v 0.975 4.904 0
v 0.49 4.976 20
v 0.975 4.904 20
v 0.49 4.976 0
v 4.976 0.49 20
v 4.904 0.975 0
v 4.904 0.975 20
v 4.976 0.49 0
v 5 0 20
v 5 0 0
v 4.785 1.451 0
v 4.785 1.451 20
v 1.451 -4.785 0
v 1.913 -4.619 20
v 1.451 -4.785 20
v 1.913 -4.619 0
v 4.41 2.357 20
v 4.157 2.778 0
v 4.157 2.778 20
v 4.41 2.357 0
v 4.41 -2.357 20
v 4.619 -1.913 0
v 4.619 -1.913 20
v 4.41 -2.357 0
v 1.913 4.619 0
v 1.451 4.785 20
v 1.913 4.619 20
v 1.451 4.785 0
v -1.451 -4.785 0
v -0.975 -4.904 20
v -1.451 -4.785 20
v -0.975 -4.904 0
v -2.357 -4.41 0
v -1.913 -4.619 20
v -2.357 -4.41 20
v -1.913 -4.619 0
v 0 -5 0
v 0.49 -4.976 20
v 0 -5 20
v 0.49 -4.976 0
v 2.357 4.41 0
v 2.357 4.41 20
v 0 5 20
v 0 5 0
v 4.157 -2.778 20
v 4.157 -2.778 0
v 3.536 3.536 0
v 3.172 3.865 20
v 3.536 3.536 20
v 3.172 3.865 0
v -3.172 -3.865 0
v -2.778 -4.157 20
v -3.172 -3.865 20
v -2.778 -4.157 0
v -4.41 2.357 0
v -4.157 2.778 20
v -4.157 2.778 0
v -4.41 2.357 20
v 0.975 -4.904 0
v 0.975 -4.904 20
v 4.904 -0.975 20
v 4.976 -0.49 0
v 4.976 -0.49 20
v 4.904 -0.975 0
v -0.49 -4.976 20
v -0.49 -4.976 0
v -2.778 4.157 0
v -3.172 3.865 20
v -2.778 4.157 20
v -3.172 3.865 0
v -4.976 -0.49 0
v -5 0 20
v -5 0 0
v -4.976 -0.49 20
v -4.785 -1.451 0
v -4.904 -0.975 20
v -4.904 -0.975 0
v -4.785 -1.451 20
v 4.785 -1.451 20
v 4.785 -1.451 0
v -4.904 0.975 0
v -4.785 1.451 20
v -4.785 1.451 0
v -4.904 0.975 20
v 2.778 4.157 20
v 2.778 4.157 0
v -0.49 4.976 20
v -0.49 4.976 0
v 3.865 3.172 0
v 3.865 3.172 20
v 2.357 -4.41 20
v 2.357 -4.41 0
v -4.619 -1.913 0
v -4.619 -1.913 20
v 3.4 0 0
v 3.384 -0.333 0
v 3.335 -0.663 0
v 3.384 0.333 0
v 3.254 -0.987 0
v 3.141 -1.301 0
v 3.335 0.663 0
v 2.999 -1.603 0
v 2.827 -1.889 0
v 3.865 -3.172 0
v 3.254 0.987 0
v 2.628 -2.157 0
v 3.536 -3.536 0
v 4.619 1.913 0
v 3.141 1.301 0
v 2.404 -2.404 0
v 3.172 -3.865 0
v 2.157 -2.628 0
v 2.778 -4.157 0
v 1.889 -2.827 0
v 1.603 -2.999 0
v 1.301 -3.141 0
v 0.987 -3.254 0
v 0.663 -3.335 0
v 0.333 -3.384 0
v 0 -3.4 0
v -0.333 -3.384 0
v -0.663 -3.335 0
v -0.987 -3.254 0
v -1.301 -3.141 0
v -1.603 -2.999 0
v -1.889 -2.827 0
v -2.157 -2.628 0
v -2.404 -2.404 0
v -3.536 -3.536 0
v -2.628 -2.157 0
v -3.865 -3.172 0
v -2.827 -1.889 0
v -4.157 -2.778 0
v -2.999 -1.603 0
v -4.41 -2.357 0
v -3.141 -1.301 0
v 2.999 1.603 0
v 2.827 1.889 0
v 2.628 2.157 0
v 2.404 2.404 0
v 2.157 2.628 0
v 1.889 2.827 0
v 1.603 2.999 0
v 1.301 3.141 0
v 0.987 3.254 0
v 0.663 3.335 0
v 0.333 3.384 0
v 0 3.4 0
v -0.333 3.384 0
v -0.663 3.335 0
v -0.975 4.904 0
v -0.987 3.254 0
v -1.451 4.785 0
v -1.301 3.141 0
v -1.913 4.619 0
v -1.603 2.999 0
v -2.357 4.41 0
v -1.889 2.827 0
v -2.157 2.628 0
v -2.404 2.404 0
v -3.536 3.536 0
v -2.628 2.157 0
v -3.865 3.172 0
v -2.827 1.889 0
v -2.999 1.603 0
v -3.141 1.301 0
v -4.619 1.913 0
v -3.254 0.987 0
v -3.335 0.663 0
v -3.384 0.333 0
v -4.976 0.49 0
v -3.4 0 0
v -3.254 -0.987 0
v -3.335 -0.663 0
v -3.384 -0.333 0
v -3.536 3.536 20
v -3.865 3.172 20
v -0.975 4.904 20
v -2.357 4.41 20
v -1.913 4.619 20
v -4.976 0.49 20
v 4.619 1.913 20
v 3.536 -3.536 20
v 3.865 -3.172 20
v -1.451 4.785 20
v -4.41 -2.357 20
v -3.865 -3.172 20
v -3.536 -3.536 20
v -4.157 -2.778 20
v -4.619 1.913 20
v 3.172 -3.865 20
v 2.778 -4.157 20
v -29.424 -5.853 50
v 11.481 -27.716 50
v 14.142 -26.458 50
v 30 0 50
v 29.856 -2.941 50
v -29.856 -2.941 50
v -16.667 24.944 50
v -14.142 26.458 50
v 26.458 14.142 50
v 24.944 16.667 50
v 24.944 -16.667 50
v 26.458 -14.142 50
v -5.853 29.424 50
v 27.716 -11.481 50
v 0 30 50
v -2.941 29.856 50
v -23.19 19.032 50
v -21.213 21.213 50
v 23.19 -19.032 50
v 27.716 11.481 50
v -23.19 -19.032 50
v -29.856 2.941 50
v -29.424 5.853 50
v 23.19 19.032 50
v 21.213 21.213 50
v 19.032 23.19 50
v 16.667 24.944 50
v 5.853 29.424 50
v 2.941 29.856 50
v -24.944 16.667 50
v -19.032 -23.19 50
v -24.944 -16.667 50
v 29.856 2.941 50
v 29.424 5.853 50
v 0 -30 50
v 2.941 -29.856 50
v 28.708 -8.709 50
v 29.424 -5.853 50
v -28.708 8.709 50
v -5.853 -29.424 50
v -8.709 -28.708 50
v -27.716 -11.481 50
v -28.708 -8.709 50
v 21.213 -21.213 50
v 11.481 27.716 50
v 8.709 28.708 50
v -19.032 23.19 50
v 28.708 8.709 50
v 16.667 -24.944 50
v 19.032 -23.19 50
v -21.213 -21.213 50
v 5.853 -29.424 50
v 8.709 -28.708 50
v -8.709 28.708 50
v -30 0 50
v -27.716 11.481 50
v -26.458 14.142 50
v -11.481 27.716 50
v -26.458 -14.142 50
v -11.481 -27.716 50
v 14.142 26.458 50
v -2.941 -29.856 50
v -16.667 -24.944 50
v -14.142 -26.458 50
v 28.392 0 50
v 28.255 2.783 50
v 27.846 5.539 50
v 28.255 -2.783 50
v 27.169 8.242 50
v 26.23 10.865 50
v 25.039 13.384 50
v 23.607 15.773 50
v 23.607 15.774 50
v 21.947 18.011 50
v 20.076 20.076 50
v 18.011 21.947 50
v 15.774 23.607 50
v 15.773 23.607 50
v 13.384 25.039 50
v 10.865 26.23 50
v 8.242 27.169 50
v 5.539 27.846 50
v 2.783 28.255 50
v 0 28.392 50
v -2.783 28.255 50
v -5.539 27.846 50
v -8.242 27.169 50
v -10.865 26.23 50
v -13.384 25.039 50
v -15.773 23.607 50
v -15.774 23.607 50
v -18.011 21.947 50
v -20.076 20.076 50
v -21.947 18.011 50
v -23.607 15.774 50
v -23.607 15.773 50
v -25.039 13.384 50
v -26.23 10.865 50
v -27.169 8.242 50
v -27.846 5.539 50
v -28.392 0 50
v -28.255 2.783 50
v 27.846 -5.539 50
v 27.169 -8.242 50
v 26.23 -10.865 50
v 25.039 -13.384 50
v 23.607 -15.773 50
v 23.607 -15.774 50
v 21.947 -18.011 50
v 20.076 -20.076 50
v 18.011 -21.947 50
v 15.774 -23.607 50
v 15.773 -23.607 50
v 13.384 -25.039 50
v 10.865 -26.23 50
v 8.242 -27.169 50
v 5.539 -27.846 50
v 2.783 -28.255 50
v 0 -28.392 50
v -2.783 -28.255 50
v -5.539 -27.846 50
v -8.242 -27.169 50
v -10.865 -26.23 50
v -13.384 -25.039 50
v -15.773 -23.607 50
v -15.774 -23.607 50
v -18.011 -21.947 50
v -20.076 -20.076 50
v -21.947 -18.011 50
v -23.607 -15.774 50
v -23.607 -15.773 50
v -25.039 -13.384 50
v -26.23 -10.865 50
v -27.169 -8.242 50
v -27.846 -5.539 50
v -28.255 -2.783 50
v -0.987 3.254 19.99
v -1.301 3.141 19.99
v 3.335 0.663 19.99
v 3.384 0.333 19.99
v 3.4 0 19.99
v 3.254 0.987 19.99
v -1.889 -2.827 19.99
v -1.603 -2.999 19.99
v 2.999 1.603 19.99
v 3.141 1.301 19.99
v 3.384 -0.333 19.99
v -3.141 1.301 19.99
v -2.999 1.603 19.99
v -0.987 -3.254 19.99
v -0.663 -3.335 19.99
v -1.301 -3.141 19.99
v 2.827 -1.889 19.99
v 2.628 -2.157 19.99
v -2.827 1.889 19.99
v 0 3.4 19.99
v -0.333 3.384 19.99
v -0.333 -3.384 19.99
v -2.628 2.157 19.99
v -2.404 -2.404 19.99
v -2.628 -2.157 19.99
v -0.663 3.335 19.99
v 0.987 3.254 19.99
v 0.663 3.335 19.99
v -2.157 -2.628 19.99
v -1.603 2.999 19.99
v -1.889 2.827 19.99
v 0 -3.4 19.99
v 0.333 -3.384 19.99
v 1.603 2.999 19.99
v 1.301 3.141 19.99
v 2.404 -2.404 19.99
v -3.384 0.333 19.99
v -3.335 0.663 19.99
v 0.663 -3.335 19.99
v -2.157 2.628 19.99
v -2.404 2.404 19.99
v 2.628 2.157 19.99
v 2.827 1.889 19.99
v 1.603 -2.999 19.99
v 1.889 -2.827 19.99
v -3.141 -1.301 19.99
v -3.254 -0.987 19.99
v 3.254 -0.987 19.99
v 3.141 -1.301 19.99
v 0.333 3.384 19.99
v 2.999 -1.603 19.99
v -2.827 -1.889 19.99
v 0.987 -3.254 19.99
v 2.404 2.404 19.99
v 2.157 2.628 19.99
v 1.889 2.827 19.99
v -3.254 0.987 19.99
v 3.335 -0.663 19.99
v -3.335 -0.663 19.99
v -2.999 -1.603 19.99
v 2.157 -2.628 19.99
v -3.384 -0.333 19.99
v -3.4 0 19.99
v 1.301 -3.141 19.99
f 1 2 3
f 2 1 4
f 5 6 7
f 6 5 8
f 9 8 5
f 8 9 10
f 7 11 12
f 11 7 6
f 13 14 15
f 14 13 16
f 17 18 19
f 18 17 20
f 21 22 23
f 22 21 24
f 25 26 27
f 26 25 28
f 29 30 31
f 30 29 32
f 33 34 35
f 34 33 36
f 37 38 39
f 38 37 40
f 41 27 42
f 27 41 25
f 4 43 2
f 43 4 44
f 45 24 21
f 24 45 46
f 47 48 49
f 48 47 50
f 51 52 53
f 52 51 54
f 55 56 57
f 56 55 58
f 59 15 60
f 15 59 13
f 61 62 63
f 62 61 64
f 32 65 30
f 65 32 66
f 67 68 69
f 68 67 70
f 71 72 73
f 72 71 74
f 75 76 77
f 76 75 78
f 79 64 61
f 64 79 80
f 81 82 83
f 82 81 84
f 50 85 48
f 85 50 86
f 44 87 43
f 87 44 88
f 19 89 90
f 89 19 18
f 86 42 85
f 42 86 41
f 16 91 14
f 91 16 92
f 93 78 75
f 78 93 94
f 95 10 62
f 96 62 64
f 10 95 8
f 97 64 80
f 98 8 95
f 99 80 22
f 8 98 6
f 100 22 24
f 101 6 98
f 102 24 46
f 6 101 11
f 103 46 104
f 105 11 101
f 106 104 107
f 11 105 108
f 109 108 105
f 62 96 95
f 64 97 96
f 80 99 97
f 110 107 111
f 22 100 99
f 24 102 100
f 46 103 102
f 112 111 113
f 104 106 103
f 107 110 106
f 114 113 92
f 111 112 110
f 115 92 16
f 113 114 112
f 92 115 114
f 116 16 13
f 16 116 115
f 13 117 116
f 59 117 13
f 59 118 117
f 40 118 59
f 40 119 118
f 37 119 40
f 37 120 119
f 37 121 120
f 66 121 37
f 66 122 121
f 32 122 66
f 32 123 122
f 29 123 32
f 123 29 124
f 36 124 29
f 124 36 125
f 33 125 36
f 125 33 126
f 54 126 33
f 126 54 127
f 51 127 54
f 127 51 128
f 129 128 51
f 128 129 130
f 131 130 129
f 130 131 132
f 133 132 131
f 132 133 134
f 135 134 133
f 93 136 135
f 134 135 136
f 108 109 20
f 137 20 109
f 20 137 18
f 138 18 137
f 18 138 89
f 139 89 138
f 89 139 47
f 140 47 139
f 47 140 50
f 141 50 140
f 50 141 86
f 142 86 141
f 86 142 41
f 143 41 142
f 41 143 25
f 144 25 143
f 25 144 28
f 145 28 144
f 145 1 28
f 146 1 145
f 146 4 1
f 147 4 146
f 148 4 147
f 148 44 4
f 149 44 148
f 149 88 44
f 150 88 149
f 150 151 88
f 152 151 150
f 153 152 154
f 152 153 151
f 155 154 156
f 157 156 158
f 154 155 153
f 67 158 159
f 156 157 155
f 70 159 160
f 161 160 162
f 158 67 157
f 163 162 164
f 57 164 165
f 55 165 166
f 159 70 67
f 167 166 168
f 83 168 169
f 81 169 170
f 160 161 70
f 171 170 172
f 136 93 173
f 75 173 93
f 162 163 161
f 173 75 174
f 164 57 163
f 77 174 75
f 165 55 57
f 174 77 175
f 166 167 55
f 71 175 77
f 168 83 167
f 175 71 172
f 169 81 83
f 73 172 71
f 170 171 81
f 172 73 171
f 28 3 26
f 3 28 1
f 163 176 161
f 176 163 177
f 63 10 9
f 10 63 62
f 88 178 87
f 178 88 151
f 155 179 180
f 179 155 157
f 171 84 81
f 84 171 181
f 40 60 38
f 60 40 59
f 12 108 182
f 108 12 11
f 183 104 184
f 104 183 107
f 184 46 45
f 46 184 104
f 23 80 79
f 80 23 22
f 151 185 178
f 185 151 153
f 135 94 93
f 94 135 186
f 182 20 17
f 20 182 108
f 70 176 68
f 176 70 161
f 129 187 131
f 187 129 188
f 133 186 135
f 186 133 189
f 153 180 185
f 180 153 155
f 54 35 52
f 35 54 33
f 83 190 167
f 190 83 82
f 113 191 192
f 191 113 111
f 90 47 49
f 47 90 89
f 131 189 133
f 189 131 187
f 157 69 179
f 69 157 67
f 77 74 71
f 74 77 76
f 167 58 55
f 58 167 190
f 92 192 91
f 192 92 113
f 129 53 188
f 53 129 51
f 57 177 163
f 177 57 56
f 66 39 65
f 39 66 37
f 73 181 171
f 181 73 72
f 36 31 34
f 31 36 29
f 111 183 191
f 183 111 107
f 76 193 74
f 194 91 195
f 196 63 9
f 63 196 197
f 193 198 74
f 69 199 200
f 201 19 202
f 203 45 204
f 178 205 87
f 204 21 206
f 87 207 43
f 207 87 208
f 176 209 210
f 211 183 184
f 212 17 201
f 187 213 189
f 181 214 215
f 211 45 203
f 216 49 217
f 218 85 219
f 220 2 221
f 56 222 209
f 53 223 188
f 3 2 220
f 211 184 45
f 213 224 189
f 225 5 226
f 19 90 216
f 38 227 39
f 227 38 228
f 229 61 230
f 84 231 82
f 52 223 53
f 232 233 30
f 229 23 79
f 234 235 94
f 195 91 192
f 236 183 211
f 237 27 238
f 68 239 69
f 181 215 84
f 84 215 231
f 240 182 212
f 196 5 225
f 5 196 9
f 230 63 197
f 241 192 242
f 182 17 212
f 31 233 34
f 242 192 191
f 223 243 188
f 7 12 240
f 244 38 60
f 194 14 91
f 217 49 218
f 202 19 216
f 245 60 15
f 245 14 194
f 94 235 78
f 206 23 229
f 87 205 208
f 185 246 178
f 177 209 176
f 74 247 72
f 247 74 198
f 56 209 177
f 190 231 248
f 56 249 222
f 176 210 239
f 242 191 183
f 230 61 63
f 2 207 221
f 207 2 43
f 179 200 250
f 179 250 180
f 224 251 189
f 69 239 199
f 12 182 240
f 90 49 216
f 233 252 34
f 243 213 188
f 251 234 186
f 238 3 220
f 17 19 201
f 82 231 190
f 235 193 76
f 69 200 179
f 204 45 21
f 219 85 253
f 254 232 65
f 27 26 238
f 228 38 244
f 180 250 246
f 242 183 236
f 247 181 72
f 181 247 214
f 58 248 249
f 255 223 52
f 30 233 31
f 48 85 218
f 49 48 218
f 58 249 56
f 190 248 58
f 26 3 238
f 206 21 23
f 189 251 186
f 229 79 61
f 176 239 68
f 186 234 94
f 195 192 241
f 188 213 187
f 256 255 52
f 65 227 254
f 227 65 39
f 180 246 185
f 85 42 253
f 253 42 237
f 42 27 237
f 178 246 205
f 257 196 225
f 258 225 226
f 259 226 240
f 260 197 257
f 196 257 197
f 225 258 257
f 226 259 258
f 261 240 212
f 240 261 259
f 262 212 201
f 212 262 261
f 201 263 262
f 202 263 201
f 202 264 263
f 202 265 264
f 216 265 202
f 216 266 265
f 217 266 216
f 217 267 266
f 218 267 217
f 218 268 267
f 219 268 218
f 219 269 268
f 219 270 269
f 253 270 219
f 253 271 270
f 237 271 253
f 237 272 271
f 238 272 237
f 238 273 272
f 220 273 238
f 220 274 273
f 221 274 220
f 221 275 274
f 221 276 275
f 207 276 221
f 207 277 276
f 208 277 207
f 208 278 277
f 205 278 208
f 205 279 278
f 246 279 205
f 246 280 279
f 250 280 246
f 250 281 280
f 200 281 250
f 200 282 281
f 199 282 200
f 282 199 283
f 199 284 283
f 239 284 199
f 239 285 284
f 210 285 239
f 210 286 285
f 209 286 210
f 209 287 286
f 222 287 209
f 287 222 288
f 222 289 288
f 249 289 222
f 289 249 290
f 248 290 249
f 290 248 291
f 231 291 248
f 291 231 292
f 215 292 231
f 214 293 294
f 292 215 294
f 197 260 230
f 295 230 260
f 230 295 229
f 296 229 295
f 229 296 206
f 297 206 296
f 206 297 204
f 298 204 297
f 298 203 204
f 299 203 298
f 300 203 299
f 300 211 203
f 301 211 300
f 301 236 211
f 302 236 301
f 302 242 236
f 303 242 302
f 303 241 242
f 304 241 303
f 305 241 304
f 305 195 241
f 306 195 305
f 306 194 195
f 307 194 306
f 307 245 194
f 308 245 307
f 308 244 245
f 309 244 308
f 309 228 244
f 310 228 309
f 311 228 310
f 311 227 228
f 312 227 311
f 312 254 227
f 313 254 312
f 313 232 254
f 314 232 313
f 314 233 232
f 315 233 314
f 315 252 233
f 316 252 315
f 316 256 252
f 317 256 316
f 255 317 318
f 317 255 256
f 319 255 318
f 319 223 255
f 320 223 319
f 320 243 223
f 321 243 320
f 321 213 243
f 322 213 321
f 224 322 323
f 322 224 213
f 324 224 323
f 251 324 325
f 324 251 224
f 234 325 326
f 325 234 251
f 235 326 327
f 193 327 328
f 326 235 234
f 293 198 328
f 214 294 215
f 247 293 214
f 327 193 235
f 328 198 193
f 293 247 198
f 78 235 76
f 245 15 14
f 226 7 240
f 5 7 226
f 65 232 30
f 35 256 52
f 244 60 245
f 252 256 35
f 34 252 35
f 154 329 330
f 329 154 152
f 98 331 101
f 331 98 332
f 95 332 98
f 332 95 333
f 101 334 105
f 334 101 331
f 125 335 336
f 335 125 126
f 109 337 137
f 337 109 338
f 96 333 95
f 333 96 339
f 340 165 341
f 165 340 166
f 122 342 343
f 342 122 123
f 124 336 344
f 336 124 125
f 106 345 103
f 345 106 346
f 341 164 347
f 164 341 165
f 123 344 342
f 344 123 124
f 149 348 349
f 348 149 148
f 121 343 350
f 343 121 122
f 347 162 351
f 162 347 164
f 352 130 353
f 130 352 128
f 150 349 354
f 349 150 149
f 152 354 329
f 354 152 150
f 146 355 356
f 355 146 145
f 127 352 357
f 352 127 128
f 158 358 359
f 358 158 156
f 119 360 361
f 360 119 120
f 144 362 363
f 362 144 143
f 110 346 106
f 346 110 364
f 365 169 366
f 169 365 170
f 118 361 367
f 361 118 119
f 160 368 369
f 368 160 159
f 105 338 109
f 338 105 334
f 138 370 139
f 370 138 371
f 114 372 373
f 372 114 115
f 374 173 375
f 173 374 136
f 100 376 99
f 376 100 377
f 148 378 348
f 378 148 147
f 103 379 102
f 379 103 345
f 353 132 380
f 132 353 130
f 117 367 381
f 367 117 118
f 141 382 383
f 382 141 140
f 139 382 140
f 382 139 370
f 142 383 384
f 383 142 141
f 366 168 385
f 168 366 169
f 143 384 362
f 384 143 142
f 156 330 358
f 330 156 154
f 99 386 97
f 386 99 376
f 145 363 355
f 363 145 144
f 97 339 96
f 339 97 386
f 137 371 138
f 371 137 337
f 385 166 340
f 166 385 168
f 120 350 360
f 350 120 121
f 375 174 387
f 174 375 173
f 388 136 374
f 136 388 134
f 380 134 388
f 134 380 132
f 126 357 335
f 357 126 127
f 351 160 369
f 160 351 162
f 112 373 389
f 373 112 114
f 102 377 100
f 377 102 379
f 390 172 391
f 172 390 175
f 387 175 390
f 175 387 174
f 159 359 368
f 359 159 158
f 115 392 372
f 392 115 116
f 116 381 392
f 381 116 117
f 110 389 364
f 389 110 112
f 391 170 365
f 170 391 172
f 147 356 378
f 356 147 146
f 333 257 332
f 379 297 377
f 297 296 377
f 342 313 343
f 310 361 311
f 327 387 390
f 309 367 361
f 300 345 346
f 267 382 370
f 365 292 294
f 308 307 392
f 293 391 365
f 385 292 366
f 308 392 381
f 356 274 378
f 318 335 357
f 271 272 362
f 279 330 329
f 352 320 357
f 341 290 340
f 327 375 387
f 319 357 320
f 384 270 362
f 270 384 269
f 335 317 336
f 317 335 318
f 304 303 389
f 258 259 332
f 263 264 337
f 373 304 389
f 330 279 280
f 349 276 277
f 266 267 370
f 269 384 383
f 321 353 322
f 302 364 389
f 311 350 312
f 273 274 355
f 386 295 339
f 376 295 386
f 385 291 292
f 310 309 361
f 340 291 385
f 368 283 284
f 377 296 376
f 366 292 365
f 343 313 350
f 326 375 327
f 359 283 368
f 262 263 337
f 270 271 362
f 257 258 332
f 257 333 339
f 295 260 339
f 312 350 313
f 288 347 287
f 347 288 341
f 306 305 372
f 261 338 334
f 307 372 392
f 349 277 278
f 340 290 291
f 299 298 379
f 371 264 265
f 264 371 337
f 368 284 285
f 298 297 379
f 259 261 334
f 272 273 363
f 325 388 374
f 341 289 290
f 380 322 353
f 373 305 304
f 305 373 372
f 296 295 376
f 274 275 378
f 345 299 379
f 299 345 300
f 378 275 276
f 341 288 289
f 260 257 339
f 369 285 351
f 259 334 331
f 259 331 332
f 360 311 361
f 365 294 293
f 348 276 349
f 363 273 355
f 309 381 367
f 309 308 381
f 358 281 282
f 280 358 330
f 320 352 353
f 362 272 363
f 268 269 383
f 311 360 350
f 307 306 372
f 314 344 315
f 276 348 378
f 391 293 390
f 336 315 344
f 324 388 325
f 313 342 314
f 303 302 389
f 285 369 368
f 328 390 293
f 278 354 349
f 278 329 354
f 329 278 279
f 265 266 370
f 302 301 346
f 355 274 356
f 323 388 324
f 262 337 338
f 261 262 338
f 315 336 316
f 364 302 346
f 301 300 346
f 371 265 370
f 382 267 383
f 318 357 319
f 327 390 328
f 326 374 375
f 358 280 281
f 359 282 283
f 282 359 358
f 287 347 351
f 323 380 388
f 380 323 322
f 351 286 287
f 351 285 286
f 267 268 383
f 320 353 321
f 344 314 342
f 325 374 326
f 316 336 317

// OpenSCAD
$fn = 64;

// Dimensions (in mm)
spout_od_r = 5;           // Outer radius of spout
wall_thick = 1.6;         // Wall thickness
spout_id_r = spout_od_r - wall_thick; // Inner radius of spout
spout_height = 20;        // Spout height from z=0 to z=20

cone_top_z = 50;          // Top of cone at z=50
cone_height = cone_top_z - spout_height; // Height of cone = 30 mm
cone_top_od_r = 30;       // Outer radius at top of cone
cone_top_id_r = cone_top_od_r - wall_thick; // Inner radius at top of cone

// Build the funnel
difference() {
  union() {
    // Outer spout cylinder (z=0 to z=20, OD=10mm)
    cylinder(h=spout_height, r=spout_od_r, $fn=64);
    
    // Outer cone (z=20 to z=50, OD from 10mm to 60mm)
    translate([0, 0, spout_height])
    cylinder(h=cone_height, r1=spout_od_r, r2=cone_top_od_r, $fn=64);
  }
  
  // Hollow out the spout (inner bore = 6.8mm)
  translate([0, 0, -0.01])
  cylinder(h=spout_height+0.02, r=spout_id_r, $fn=64);
  
  // Hollow out the cone (inner surface)
  translate([0, 0, spout_height-0.01])
  cylinder(h=cone_height+0.02, r1=spout_id_r, r2=cone_top_id_r, $fn=64);
}
